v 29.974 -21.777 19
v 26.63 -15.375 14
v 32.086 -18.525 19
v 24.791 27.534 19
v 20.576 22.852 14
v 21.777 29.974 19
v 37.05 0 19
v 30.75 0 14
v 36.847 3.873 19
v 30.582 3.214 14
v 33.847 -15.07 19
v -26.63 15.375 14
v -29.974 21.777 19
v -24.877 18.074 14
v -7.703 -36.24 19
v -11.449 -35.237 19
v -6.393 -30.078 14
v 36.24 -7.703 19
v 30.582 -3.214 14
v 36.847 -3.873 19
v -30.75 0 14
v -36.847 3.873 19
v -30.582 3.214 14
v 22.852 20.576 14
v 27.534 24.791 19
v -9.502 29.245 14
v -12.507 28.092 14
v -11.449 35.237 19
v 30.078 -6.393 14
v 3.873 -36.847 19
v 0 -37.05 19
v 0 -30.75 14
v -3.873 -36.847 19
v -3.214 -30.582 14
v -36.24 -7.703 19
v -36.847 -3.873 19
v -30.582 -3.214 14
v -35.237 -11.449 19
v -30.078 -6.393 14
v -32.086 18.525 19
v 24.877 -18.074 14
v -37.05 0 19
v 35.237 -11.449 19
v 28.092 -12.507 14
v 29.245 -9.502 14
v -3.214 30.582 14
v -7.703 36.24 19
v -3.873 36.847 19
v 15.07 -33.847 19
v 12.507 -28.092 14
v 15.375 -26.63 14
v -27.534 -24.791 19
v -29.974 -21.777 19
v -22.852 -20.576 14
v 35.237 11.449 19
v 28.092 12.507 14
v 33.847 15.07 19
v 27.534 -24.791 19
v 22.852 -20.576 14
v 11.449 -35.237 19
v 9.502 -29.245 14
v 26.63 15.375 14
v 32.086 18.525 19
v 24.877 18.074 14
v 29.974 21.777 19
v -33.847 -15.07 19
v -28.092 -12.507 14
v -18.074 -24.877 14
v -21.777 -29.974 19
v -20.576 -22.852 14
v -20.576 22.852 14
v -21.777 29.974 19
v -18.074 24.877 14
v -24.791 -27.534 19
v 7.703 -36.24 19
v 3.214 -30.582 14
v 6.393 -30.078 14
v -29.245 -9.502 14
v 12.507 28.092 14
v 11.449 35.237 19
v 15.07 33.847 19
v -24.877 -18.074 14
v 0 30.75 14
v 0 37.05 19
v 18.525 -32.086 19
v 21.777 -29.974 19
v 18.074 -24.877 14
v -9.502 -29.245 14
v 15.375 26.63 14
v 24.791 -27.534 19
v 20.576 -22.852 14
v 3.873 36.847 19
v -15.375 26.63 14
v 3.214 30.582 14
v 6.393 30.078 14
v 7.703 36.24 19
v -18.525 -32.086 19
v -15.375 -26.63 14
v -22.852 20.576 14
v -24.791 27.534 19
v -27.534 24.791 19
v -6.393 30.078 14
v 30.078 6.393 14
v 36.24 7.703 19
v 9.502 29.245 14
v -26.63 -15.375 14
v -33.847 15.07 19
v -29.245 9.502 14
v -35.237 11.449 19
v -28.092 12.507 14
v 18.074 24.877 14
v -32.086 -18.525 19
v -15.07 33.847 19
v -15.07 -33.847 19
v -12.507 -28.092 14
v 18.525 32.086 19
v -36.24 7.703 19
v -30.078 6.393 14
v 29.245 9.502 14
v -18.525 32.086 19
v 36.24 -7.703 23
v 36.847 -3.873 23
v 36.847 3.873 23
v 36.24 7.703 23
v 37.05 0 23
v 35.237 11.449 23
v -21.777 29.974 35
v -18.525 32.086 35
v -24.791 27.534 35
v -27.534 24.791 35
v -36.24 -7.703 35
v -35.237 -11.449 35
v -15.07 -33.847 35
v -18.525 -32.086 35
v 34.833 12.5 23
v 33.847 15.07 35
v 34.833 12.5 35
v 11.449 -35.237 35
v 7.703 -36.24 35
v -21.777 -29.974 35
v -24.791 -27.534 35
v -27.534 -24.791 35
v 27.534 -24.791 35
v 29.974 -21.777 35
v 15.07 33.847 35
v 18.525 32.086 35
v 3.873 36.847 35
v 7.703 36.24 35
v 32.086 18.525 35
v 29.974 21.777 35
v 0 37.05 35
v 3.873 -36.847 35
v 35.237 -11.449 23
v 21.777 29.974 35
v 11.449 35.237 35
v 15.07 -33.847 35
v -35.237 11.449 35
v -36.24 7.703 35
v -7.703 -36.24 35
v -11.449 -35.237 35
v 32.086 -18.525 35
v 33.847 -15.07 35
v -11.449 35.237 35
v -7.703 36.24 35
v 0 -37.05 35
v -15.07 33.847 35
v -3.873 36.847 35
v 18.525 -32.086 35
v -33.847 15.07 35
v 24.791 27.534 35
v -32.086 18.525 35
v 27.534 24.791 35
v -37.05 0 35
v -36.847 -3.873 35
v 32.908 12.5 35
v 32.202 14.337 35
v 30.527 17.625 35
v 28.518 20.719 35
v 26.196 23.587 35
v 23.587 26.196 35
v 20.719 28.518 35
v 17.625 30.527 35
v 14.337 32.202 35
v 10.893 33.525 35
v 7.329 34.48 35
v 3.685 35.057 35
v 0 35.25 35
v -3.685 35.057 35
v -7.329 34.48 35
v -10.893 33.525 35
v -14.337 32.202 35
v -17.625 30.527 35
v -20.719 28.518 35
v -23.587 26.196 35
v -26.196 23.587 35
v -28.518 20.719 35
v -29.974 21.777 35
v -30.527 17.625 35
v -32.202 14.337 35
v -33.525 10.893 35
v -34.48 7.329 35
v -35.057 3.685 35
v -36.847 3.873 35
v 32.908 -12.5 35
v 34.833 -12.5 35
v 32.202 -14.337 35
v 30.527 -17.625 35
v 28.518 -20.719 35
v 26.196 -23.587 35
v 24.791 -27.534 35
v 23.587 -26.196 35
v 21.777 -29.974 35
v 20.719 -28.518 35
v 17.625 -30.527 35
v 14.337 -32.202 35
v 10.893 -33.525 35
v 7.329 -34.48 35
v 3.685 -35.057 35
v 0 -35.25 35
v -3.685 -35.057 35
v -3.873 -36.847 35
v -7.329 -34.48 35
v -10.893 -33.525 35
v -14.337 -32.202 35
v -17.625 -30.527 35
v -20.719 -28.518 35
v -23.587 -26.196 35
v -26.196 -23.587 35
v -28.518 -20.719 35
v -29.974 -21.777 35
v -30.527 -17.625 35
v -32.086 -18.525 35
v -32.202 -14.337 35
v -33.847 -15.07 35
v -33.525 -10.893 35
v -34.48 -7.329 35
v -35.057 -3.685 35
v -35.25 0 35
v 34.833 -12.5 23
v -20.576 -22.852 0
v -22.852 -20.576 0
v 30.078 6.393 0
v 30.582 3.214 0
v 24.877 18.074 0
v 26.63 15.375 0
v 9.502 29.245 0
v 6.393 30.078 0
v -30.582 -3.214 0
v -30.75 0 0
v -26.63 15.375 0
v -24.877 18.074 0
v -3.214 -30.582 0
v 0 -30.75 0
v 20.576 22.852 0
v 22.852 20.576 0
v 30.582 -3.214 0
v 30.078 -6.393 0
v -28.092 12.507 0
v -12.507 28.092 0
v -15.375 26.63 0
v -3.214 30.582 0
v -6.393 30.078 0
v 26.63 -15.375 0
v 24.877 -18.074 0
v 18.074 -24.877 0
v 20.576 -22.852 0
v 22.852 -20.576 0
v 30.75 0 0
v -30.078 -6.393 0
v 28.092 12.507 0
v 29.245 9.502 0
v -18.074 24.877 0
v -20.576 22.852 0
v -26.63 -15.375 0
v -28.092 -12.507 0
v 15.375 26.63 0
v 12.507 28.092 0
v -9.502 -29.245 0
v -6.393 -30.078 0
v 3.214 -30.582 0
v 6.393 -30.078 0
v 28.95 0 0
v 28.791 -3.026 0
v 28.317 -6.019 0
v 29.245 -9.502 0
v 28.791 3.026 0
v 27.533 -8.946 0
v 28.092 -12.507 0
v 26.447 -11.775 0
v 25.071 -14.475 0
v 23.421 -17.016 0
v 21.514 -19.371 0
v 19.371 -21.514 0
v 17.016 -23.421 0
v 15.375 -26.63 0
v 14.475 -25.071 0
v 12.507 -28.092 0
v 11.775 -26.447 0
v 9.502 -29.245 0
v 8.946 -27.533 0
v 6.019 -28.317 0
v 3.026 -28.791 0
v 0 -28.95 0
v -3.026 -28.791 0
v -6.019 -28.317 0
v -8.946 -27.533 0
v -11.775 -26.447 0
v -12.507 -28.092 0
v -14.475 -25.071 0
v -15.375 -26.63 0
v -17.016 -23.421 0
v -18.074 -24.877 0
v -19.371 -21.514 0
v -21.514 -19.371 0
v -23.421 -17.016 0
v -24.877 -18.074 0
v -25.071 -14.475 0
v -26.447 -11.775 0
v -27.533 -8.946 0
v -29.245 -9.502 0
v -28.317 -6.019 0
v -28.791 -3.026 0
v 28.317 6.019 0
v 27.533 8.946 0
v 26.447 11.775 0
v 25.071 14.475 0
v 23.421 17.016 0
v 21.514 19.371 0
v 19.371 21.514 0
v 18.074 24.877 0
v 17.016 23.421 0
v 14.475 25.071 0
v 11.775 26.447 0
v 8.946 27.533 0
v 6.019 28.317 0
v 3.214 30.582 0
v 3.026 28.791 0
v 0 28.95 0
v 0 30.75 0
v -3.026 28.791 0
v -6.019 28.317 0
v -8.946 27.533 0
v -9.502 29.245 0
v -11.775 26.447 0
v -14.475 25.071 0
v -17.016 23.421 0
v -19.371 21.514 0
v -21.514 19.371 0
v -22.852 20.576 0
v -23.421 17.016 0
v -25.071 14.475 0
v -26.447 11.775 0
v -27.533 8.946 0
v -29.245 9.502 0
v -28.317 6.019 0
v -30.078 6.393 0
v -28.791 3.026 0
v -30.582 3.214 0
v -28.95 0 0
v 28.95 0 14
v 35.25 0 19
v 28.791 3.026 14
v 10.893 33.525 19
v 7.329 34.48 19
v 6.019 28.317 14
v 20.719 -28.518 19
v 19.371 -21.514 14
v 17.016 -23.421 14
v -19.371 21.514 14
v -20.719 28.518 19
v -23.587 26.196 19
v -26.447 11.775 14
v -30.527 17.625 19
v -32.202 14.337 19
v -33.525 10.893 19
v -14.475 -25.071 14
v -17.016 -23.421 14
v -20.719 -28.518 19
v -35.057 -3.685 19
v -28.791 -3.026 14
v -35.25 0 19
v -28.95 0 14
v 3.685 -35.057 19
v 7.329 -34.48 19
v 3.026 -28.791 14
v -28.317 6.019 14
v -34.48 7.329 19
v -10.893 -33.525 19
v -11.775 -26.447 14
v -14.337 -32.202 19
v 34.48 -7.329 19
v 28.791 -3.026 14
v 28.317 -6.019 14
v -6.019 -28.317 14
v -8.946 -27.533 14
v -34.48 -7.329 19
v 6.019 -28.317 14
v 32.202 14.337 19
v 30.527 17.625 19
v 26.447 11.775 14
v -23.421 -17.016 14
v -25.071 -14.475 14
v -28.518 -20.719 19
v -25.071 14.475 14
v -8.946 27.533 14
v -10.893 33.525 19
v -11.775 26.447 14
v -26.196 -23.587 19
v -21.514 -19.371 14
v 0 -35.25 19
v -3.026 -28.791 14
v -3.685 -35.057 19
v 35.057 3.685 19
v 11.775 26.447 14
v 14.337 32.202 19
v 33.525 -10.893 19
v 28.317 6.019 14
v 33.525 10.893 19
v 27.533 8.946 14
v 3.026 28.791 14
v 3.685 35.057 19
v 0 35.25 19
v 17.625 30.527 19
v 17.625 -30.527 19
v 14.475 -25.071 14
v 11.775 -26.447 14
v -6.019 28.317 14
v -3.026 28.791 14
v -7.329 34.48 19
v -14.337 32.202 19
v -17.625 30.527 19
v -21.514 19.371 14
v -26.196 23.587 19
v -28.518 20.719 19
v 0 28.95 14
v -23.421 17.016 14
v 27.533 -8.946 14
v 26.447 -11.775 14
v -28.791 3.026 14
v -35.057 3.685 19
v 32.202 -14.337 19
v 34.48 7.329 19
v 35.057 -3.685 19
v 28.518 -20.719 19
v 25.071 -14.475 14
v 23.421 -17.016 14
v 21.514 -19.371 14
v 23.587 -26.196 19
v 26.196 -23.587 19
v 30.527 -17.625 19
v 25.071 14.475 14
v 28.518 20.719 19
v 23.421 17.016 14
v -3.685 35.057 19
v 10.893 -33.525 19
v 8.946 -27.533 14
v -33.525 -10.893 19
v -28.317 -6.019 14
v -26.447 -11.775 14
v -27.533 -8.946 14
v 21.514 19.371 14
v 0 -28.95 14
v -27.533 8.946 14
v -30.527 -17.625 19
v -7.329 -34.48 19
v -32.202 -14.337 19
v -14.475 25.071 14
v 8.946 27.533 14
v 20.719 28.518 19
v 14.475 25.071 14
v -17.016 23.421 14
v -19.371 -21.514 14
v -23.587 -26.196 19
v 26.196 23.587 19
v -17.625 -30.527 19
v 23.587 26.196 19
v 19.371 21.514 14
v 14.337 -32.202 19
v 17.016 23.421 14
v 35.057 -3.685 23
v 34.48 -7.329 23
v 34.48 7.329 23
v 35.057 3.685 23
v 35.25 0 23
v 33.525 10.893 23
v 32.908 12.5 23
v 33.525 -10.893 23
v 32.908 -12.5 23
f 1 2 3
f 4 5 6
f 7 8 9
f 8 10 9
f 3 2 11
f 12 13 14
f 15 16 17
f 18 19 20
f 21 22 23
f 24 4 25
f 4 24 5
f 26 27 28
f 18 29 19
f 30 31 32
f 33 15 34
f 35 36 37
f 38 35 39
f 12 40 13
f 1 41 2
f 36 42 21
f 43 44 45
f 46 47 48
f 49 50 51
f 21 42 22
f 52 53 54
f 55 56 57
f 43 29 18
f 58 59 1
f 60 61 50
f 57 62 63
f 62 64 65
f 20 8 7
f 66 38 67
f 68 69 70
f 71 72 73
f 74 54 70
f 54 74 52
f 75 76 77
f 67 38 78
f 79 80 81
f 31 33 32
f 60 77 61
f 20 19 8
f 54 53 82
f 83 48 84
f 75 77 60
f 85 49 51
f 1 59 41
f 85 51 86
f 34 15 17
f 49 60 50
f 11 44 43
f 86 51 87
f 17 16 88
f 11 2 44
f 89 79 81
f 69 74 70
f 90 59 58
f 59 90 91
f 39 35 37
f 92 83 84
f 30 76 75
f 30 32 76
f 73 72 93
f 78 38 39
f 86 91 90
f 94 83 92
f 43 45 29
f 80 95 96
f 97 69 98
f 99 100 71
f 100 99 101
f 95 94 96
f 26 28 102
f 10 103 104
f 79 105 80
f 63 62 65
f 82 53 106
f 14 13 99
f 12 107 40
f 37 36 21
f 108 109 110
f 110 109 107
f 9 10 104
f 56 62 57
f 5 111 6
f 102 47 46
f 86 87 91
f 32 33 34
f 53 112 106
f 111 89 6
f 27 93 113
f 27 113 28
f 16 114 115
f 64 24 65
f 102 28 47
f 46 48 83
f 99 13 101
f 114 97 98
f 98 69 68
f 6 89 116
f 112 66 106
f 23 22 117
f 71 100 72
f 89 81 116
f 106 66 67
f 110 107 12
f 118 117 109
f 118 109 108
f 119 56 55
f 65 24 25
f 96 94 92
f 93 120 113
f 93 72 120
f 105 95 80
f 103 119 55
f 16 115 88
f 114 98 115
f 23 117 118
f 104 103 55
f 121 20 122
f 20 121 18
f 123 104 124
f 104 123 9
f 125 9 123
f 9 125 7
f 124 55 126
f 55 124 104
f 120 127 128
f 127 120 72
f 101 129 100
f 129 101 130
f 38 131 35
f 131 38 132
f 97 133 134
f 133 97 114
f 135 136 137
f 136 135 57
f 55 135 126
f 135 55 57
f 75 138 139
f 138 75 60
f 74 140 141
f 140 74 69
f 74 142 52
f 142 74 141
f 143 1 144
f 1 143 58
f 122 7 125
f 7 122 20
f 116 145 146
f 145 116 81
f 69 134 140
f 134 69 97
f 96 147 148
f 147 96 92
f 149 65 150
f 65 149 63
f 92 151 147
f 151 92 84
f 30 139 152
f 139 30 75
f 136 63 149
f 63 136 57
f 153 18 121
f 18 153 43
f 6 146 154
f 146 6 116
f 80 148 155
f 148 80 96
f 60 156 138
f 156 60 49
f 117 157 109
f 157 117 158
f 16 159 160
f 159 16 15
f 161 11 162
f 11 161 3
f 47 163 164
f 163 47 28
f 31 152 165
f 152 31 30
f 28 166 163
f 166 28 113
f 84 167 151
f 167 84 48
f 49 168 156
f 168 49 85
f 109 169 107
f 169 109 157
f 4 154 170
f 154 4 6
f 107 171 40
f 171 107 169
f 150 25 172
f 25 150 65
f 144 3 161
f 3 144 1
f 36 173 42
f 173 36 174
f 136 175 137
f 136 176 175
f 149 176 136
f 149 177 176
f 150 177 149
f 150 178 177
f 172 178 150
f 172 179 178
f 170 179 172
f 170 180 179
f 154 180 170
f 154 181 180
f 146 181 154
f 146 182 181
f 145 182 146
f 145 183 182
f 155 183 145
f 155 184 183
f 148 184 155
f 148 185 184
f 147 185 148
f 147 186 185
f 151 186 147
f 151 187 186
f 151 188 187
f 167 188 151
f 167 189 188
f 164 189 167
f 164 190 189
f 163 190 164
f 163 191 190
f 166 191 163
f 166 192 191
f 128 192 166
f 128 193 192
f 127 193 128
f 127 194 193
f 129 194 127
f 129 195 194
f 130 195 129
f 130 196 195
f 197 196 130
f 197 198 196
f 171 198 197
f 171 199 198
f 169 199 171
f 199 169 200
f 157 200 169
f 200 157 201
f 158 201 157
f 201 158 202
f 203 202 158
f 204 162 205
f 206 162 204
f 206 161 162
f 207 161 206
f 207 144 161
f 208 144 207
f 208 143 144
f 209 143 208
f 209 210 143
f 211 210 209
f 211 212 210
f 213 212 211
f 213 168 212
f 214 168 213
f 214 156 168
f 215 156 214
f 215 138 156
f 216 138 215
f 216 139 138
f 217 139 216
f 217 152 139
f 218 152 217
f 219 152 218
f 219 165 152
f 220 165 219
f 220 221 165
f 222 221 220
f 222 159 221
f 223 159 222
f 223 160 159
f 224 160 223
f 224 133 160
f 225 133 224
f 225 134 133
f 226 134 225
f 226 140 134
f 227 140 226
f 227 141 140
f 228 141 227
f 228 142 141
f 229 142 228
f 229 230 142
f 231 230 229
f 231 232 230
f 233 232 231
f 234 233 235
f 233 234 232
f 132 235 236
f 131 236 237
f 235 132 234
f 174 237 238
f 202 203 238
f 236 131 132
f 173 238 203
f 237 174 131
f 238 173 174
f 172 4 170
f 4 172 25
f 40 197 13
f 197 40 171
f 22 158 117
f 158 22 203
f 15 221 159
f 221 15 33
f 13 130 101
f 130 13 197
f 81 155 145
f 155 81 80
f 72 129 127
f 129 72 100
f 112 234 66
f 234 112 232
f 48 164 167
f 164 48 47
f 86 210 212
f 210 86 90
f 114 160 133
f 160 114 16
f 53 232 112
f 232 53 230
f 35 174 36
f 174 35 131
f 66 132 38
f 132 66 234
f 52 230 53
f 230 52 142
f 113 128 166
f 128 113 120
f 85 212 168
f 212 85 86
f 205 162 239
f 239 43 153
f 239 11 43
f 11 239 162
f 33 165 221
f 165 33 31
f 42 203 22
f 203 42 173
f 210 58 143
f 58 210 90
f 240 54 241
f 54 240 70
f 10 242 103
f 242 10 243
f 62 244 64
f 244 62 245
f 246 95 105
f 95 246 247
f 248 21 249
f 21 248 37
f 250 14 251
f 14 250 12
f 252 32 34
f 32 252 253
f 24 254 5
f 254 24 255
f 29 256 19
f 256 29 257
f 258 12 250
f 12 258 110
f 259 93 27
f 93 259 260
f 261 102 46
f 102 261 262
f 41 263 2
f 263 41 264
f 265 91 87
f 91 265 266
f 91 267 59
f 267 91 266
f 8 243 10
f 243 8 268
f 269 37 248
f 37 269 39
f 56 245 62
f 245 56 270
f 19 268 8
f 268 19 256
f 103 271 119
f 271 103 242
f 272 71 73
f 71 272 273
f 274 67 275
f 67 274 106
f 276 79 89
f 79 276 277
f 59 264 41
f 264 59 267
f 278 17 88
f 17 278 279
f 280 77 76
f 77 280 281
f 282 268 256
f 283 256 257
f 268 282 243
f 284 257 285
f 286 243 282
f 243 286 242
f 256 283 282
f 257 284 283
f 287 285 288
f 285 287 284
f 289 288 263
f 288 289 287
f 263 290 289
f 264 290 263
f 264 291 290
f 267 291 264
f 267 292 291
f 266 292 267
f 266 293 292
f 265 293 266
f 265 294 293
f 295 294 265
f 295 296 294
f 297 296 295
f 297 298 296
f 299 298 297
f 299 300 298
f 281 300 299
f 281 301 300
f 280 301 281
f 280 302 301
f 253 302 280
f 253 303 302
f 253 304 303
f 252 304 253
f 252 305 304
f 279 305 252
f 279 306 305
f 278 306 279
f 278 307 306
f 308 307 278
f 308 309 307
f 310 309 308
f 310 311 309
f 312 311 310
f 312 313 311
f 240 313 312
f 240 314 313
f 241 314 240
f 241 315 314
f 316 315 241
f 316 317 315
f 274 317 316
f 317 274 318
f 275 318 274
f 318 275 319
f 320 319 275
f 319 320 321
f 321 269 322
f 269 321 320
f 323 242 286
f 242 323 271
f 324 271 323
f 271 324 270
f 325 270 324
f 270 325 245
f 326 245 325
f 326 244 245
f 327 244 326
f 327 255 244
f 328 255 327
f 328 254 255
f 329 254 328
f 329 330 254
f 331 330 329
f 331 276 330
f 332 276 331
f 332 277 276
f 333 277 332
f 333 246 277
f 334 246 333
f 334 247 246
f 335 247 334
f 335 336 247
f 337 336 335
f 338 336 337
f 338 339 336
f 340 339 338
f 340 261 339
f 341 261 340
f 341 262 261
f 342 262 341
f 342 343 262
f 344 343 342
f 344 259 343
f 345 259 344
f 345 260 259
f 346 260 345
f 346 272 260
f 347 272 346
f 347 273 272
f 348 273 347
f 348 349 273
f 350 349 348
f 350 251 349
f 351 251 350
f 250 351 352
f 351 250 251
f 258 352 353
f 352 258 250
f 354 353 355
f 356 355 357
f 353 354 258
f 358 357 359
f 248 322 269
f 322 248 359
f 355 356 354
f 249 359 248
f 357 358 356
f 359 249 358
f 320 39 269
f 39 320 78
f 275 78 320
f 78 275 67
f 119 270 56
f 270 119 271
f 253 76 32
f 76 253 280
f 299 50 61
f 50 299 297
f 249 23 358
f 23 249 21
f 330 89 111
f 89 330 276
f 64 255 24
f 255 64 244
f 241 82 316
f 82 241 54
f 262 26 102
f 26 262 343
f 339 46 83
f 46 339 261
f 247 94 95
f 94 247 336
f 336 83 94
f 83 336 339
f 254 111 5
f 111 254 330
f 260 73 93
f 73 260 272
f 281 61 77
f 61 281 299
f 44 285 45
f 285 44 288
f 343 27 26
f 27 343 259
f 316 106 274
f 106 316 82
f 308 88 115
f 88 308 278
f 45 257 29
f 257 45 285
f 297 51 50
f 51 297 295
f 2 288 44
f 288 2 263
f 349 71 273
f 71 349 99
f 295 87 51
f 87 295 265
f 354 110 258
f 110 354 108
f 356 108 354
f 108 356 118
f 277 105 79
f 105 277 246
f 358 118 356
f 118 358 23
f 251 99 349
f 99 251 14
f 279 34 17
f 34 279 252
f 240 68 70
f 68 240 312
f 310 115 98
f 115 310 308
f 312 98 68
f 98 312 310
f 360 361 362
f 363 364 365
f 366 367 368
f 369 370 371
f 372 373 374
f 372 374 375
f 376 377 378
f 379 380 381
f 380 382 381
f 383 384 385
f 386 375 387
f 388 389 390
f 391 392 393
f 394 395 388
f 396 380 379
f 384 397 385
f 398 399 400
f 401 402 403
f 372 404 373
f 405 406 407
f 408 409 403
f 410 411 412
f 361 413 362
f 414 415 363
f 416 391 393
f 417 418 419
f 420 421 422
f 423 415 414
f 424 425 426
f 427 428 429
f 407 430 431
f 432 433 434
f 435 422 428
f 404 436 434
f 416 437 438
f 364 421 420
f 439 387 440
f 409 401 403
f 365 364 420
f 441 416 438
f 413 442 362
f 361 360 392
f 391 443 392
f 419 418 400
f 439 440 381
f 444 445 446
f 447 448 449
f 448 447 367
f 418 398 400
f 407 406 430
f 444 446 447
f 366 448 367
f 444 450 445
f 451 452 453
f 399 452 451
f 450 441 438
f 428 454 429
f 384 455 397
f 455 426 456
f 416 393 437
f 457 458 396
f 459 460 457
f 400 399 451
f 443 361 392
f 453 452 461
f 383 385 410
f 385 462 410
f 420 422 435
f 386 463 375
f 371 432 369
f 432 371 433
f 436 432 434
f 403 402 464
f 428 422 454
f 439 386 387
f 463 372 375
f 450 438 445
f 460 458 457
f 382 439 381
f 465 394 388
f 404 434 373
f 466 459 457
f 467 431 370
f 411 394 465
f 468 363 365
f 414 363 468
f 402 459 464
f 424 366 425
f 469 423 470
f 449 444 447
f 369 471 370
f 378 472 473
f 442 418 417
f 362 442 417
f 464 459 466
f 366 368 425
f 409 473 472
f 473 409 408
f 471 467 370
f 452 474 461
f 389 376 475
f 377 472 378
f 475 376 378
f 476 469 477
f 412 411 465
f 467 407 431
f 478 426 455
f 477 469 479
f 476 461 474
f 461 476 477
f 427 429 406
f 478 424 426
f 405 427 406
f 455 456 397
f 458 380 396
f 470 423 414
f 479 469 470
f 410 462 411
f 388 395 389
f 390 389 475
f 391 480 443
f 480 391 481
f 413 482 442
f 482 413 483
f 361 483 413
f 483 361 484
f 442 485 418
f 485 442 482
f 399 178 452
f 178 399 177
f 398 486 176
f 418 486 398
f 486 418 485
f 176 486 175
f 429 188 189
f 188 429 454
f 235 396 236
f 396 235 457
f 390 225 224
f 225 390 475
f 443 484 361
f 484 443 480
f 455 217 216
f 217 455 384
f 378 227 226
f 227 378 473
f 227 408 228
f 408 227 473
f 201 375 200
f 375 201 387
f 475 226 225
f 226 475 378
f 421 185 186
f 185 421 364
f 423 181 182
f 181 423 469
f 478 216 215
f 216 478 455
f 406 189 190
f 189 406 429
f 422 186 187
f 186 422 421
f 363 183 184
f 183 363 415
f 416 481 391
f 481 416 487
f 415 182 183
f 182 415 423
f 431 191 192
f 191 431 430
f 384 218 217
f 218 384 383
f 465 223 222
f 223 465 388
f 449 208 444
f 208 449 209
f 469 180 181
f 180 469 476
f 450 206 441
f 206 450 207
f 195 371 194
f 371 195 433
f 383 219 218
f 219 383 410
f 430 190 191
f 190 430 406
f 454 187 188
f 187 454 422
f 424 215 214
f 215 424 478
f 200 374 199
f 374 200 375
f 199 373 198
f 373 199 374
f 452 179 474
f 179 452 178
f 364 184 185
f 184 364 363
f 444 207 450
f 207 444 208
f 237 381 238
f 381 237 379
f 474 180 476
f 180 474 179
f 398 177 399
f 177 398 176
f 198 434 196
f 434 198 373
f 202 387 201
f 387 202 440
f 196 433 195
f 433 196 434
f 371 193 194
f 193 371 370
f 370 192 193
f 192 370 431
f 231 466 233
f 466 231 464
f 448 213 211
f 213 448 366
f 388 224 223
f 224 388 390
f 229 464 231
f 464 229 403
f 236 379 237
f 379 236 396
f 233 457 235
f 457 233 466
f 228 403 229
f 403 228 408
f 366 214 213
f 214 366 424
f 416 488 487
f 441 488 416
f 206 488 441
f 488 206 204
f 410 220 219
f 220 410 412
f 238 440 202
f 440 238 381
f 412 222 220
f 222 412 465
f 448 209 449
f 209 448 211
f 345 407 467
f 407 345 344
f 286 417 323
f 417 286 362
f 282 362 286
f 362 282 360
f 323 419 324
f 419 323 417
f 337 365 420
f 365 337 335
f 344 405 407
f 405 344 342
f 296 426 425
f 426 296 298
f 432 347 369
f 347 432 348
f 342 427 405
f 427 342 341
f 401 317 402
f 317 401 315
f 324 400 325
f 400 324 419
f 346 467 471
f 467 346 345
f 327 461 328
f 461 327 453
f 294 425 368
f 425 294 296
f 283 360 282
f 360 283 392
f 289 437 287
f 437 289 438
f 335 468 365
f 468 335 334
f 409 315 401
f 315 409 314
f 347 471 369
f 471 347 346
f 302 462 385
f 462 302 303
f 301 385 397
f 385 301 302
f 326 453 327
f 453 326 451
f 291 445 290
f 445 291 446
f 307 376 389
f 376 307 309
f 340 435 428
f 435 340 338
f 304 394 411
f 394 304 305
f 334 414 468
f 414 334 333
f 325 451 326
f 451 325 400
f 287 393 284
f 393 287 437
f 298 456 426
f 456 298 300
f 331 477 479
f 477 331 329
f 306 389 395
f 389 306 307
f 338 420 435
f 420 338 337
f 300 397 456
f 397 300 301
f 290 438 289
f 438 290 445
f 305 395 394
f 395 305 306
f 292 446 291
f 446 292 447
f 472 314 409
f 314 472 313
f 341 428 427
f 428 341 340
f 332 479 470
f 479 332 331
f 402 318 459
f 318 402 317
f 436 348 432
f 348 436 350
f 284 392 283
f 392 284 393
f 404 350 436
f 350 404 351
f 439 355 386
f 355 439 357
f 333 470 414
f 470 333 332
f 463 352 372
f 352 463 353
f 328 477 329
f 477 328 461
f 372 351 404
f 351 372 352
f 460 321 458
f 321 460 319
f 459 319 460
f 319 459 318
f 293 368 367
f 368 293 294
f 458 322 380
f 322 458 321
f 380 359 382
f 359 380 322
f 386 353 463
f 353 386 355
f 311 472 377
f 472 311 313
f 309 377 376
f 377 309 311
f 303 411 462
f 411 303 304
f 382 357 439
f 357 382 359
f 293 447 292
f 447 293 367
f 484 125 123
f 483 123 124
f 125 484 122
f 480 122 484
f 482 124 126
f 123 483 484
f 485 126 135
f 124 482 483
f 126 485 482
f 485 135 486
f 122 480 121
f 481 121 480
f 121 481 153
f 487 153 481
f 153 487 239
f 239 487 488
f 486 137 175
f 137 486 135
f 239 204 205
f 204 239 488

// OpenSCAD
//FollyMaker
//Vacuum Hose Adapter Beta 0.2 Testing
//Gather the parameters
/* [Parameters] */

//--Example is ShopVac Nominal 2.5" machine port to 1.5" accessory.  -- For the Lower end, is the measurement the adapter's outside or inside diameter?
LowerEndMeasured = "outside"; //[outside, inside]
//Diameter of Lower End? (mm)
LowerEndDiameter = 61.5;
// Length of Lower End? (mm)
LowerEndLength = 14;
//For the Upper end, is the measurement the adapter's outside or inside diameter?
UpperEndMeasured = "inside"; //[outside, inside]
//Diameter of Upper End? (mm)
UpperEndDiameter = 70.5;
// Length of Upper End? (mm)
UpperEndLength = 16;
// Length of Taper Section? (mm)
TaperLength = 5;
 // Create an Inside Stop at the lower end of Upperer end of this adapter? (To keep the connected fitting from being sucked in.)
 InsideStop= "no"; //[no,yes]
 //What is the thickness of the adapter's walls?
 WallThickness = 1.8;

// Flag indicating whether to cutout notch from top
hasCutout = "yes";

// Cutout dimensions
cutOutHeight = 12;
cutOutWidth = 25;

// [yes,no] Flag indicating whether to generate flange
hasFlange = "no";

 
 $fn=60 *1;
 
     WT=WallThickness;
     LL=LowerEndLength;
     SL=UpperEndLength;
     TL=TaperLength;
     
     
     LD=  LowerEndMeasured =="inside" ? LowerEndDiameter + 2*WT : LowerEndDiameter;
     SD=  UpperEndMeasured =="inside" ? UpperEndDiameter + 2*WT : UpperEndDiameter;
     LID=  LowerEndMeasured =="inside" ? LD : LD - 2*WT;
     SID=  UpperEndMeasured =="inside" ? SD : SD - 2*WT;
     LID = LD - 2*WT;
     SID = SD - 2*WT;
     DR = LD + 3*WT;

top = (hasFlange == "yes")
  ? SL + LL + TL + 2*WT
  : SL + LL + TL;
 

module TransCylinder(D1, D2, H, Z)
    {
        translate([0, 0, Z])
        {
            cylinder(d1=D1, d2=D2, h=H, center=false);
        }
    }
   
difference()
{
    union()
        { 
            TransCylinder(LD, LD, LL, 0);                   // Lower
          
            if (hasFlange == "yes") {
                TransCylinder(LD, DR, WT, LL);              // Lower to Flange
                TransCylinder(DR, DR, WT, LL + WT);         // Flange
                TransCylinder(LD, SD, TL, LL + 2*WT);       // Flange to Upper
                TransCylinder(SD, SD, SL, LL + TL + 2*WT);  // Upper
            } else {
                TransCylinder(LD, SD, TL, LL);              // Transition
                TransCylinder(SD, SD, SL, LL + TL);         // Upper  
            }
          } 
     union()
        {
            TransCylinder(LID, LID, LL + 1, 0);         // Lower
            if (hasFlange == "yes") {
                TransCylinder(LID, LID, WT, LL);        // Lower to Flange
                TransCylinder(LID, LID,  WT, LL + WT);  // Flange
                TransCylinder(LID, SID, TL, LL + 2*WT); // Flange to Upper
            } else {        
                TransCylinder(LID, SID, TL, LL);        // Lower-to-Upper
                TransCylinder(SID, SID, SL, LL + TL);   // Upper  
            }
            
            if (hasCutout == "yes") {
                translate([SD/2 - (SD/2), -(cutOutWidth / 2), top - cutOutHeight]) {
                cube([SD/2,cutOutWidth,cutOutHeight], center = false);
                
            }
        }
          
            
          
        if (InsideStop=="yes")
        {
            TransCylinder(SID, SID-(2*WT), WT, LL +TL + 2*WT);
            TransCylinder(SID, SID, SL, LL +TL + 3*WT);
        }
        else
        {          
            TransCylinder(SID, SID, SL, LL +TL + 2*WT);
        }
    }
}   
